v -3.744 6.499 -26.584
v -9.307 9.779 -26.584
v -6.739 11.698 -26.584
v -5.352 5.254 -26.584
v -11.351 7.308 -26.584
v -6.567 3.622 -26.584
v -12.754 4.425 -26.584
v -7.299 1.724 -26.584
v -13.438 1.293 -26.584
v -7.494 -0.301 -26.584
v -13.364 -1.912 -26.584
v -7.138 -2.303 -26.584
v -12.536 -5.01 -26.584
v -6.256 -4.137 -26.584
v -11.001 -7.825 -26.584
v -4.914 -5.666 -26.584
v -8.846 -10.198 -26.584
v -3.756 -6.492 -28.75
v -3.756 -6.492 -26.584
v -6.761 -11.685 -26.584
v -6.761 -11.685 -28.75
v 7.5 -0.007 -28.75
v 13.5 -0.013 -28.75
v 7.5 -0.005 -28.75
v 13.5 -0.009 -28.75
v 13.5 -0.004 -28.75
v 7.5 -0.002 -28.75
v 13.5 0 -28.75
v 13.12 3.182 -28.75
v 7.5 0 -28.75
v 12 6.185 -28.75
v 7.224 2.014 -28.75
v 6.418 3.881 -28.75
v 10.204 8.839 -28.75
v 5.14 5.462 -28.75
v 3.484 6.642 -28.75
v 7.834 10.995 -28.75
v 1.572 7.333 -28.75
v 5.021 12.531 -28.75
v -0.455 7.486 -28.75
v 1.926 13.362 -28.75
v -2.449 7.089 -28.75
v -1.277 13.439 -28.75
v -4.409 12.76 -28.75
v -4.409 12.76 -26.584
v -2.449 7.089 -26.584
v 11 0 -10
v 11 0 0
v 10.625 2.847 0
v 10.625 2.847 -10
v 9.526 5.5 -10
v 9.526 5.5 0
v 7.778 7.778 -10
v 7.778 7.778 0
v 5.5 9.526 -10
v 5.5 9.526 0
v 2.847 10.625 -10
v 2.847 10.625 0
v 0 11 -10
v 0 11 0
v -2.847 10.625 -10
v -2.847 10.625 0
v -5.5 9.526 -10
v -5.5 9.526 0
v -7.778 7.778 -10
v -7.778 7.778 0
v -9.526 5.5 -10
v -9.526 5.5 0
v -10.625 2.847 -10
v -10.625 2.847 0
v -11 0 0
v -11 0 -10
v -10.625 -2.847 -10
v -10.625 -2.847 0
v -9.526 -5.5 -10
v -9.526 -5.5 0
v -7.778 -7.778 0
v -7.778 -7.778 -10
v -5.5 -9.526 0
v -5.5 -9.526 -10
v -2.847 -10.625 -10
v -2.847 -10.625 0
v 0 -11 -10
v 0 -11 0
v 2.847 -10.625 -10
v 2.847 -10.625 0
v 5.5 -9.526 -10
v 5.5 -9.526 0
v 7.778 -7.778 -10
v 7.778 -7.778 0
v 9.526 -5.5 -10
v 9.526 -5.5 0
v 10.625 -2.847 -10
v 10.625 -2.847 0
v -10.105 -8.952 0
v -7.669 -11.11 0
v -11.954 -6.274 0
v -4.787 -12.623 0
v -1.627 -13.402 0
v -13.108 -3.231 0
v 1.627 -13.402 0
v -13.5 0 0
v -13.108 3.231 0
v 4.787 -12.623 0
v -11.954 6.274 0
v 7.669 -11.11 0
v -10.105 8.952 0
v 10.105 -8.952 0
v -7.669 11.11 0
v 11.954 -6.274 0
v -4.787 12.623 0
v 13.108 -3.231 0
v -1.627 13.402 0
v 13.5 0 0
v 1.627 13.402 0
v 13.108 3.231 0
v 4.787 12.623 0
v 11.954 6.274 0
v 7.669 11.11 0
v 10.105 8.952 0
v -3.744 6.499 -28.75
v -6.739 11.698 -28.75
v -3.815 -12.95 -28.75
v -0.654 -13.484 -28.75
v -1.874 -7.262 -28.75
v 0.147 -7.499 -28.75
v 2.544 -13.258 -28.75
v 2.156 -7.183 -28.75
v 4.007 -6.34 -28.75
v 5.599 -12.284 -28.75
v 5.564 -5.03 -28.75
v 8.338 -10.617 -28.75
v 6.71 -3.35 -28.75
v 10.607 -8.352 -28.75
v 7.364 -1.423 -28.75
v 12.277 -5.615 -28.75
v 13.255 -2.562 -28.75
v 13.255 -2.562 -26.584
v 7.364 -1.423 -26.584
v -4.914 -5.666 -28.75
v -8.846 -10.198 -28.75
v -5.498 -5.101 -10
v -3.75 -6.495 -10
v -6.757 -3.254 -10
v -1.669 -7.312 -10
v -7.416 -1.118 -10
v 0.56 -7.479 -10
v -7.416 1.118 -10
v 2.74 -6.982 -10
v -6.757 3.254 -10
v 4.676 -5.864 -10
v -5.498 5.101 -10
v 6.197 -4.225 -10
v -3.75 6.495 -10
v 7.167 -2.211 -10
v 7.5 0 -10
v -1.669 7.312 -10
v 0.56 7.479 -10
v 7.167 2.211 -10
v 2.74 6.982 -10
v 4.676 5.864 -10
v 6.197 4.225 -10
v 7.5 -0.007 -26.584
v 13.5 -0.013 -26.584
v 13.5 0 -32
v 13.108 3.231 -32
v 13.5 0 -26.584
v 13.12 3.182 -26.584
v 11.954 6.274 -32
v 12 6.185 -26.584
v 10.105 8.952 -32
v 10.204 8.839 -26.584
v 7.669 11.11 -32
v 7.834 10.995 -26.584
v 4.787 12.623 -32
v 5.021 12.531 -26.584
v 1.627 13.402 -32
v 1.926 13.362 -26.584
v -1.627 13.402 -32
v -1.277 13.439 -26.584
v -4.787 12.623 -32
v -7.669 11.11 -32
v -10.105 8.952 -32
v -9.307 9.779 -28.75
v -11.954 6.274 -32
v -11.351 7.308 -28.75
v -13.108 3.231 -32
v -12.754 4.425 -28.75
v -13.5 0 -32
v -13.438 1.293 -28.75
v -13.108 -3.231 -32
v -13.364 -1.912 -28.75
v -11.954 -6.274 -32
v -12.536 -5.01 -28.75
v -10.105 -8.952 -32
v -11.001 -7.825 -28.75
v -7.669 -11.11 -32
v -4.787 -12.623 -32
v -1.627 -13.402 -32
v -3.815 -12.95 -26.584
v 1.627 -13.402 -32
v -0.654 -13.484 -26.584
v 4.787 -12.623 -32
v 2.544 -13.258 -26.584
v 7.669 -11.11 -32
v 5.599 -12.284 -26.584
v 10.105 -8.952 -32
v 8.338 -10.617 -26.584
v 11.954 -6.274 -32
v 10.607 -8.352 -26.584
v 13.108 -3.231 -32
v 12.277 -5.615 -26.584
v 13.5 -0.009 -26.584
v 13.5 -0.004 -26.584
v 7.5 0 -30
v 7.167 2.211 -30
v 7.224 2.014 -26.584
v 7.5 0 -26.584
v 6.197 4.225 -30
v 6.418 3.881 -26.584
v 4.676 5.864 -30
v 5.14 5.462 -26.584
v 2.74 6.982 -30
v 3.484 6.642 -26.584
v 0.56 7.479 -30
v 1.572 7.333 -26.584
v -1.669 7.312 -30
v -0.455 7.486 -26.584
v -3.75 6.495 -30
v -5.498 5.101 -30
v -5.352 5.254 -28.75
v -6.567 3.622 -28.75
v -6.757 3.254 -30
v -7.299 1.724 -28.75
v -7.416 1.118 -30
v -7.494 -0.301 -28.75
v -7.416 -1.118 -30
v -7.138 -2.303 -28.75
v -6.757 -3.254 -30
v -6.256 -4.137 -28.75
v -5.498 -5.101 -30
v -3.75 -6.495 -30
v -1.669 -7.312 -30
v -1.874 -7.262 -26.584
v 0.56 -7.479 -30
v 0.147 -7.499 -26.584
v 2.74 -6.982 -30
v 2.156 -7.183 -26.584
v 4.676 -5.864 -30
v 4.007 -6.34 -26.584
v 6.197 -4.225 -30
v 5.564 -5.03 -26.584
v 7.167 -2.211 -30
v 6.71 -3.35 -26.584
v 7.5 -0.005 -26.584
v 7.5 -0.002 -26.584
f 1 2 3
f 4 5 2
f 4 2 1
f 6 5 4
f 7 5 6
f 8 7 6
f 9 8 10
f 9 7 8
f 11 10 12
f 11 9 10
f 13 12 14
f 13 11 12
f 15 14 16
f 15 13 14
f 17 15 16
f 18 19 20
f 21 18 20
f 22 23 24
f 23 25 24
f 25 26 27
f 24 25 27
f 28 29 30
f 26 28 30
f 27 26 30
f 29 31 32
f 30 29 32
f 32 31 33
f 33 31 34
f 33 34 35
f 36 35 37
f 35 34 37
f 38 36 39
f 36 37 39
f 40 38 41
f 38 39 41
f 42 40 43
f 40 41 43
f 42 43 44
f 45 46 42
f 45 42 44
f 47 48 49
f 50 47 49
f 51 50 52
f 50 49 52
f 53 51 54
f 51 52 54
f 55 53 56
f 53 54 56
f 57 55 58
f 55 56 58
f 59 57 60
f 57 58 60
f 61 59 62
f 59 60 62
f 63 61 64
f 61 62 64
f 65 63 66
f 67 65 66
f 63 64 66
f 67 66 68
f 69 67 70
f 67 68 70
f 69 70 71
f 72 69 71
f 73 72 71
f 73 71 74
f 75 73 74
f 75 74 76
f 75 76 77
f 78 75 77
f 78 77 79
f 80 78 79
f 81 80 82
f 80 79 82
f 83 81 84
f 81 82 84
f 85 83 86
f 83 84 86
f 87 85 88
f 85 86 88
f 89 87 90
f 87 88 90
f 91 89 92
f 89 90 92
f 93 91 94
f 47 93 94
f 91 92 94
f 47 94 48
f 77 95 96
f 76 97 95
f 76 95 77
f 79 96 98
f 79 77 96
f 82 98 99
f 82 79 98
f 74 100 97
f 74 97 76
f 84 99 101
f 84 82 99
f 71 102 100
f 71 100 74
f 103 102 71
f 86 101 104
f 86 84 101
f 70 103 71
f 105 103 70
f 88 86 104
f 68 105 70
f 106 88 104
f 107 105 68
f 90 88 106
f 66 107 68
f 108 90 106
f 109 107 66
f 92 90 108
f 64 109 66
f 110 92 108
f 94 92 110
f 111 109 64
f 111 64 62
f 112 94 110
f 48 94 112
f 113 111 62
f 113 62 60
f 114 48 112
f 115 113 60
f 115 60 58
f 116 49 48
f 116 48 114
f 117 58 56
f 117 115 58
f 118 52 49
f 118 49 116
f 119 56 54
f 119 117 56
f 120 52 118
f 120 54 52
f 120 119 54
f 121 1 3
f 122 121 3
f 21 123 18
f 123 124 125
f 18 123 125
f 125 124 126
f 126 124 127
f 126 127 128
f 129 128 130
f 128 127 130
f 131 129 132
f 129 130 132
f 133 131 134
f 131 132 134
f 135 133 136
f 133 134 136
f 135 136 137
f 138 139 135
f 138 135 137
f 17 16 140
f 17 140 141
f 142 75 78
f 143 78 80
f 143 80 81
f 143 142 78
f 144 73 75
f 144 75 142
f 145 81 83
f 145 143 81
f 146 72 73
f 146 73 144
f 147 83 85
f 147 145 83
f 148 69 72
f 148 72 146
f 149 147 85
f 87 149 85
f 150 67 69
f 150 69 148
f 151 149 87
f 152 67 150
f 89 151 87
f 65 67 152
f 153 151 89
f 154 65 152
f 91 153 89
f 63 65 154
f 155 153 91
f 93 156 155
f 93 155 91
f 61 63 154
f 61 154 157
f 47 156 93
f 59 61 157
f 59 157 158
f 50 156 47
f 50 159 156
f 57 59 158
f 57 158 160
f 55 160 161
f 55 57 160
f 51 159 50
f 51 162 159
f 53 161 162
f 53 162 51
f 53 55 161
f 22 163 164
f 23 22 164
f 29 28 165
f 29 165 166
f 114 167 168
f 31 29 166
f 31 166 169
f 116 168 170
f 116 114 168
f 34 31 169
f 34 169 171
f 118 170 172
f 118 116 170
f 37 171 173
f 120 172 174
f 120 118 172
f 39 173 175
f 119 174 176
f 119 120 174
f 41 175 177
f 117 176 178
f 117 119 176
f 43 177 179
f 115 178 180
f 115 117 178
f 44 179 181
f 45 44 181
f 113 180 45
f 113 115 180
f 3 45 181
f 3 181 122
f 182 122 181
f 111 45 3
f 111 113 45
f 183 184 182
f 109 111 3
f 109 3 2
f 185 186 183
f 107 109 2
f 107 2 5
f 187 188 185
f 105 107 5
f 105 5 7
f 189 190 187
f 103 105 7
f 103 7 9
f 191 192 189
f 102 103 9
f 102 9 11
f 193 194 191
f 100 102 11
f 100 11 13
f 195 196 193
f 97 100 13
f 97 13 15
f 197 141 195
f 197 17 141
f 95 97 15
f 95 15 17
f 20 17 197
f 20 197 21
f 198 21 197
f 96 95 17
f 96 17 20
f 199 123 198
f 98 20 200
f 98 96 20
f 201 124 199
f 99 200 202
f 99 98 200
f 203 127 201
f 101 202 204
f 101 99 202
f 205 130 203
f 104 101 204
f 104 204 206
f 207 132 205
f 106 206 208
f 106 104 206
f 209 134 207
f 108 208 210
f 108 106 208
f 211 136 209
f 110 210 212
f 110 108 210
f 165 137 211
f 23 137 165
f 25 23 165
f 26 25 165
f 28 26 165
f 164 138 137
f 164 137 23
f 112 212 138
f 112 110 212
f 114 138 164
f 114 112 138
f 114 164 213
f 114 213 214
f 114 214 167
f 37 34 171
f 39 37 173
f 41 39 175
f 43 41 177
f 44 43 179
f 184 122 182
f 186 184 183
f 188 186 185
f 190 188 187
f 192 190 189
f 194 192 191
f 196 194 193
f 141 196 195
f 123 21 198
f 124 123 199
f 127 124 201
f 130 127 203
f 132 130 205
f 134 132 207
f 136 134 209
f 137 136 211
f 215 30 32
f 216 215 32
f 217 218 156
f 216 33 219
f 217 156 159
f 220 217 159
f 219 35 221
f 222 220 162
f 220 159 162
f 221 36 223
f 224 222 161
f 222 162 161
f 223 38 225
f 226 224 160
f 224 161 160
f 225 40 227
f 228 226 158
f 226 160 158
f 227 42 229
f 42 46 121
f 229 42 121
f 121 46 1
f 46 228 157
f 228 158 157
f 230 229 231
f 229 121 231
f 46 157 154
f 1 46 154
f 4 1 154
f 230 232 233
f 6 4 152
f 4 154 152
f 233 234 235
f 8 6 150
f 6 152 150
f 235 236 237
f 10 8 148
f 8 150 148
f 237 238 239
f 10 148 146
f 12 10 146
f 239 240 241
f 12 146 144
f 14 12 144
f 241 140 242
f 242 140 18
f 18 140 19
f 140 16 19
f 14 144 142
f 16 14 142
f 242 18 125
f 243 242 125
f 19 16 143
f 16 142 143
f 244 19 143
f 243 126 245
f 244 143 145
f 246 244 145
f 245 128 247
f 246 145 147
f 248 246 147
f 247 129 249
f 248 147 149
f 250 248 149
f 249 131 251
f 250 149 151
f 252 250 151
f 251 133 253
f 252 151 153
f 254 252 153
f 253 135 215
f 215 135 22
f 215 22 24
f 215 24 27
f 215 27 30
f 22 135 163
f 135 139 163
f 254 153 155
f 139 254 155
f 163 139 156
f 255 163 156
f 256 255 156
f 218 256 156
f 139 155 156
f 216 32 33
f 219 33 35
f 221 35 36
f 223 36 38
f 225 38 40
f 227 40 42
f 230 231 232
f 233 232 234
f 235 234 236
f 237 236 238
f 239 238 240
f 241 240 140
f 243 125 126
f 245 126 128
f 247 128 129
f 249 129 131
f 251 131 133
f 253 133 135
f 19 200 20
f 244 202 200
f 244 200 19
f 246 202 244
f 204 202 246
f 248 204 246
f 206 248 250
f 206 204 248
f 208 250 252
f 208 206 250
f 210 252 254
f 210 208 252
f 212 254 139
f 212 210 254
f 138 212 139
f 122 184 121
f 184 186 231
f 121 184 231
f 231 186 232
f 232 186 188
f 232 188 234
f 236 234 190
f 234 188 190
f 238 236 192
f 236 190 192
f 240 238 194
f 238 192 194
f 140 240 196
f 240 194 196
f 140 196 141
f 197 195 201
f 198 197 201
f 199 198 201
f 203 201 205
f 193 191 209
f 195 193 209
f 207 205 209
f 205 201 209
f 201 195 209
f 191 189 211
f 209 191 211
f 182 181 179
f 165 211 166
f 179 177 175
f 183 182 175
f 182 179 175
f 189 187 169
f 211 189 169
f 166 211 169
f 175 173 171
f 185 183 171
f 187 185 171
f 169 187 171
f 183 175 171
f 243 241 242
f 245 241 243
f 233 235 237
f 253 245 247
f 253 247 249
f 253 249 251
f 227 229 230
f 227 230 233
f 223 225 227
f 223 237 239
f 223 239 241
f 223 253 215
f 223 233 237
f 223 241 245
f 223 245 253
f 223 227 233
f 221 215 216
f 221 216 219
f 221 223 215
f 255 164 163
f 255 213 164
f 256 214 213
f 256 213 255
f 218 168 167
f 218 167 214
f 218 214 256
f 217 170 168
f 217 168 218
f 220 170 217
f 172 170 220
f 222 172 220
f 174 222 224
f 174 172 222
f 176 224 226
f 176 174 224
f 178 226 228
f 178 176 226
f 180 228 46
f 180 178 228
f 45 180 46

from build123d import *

# Parameters (mm, degrees)
SKETCH2_R           = 13.5
BOSS_EXTRUDE1_DEPTH = 32
SKETCH4_R           = 11
CUT_EXTRUDE1_DEPTH  = 10
SKETCH5_R           = 7.5
CUT_EXTRUDE2_DEPTH  = 30
WRAP1_SECTION_W     = 12
WRAP1_SECTION_H     = 2.166
WRAP1_ANGLE         = 109.116628984
CIRPATTERN1_COUNT   = 3


with BuildPart() as part:
    # Sketch2 → Boss-Extrude1 (new body)
    with BuildSketch(Plane.XY):
        Circle(SKETCH2_R)
    extrude(amount=-BOSS_EXTRUDE1_DEPTH)

    # Sketch4 → Cut-Extrude1 (cut)
    with BuildSketch(Plane.XY):
        Circle(SKETCH4_R)
    extrude(amount=-CUT_EXTRUDE1_DEPTH, mode=Mode.SUBTRACT)

    # Sketch5 → Cut-Extrude2 (cut)
    with BuildSketch(Plane.XY):
        Circle(SKETCH5_R)
    extrude(amount=-CUT_EXTRUDE2_DEPTH, mode=Mode.SUBTRACT)

    # Wrap1 section (on wrap section) → Wrap1 (revolve, cut)
    with BuildSketch(Plane(origin=(0, 0, 0), x_dir=(0.9999995414170643, -0.0009576876636740589, 0), z_dir=(-0.0009576876636740589, -0.9999995414170643, 0))):
        with Locations((7.5, -27.667)):
            Rectangle(WRAP1_SECTION_W, WRAP1_SECTION_H)
    wrap1 = revolve(axis=Axis((0, 0, 0), (0, 0, 1)), revolution_arc=WRAP1_ANGLE, mode=Mode.SUBTRACT)

    # CirPattern1: Wrap1 ×3 about axis
    cirpattern1_axis = Axis((0, 0, 0), (0, 0, 1))
    for i in range(1, CIRPATTERN1_COUNT):
        add(wrap1.rotate(cirpattern1_axis, i * 360 / CIRPATTERN1_COUNT), mode=Mode.SUBTRACT)


solid = part.part
